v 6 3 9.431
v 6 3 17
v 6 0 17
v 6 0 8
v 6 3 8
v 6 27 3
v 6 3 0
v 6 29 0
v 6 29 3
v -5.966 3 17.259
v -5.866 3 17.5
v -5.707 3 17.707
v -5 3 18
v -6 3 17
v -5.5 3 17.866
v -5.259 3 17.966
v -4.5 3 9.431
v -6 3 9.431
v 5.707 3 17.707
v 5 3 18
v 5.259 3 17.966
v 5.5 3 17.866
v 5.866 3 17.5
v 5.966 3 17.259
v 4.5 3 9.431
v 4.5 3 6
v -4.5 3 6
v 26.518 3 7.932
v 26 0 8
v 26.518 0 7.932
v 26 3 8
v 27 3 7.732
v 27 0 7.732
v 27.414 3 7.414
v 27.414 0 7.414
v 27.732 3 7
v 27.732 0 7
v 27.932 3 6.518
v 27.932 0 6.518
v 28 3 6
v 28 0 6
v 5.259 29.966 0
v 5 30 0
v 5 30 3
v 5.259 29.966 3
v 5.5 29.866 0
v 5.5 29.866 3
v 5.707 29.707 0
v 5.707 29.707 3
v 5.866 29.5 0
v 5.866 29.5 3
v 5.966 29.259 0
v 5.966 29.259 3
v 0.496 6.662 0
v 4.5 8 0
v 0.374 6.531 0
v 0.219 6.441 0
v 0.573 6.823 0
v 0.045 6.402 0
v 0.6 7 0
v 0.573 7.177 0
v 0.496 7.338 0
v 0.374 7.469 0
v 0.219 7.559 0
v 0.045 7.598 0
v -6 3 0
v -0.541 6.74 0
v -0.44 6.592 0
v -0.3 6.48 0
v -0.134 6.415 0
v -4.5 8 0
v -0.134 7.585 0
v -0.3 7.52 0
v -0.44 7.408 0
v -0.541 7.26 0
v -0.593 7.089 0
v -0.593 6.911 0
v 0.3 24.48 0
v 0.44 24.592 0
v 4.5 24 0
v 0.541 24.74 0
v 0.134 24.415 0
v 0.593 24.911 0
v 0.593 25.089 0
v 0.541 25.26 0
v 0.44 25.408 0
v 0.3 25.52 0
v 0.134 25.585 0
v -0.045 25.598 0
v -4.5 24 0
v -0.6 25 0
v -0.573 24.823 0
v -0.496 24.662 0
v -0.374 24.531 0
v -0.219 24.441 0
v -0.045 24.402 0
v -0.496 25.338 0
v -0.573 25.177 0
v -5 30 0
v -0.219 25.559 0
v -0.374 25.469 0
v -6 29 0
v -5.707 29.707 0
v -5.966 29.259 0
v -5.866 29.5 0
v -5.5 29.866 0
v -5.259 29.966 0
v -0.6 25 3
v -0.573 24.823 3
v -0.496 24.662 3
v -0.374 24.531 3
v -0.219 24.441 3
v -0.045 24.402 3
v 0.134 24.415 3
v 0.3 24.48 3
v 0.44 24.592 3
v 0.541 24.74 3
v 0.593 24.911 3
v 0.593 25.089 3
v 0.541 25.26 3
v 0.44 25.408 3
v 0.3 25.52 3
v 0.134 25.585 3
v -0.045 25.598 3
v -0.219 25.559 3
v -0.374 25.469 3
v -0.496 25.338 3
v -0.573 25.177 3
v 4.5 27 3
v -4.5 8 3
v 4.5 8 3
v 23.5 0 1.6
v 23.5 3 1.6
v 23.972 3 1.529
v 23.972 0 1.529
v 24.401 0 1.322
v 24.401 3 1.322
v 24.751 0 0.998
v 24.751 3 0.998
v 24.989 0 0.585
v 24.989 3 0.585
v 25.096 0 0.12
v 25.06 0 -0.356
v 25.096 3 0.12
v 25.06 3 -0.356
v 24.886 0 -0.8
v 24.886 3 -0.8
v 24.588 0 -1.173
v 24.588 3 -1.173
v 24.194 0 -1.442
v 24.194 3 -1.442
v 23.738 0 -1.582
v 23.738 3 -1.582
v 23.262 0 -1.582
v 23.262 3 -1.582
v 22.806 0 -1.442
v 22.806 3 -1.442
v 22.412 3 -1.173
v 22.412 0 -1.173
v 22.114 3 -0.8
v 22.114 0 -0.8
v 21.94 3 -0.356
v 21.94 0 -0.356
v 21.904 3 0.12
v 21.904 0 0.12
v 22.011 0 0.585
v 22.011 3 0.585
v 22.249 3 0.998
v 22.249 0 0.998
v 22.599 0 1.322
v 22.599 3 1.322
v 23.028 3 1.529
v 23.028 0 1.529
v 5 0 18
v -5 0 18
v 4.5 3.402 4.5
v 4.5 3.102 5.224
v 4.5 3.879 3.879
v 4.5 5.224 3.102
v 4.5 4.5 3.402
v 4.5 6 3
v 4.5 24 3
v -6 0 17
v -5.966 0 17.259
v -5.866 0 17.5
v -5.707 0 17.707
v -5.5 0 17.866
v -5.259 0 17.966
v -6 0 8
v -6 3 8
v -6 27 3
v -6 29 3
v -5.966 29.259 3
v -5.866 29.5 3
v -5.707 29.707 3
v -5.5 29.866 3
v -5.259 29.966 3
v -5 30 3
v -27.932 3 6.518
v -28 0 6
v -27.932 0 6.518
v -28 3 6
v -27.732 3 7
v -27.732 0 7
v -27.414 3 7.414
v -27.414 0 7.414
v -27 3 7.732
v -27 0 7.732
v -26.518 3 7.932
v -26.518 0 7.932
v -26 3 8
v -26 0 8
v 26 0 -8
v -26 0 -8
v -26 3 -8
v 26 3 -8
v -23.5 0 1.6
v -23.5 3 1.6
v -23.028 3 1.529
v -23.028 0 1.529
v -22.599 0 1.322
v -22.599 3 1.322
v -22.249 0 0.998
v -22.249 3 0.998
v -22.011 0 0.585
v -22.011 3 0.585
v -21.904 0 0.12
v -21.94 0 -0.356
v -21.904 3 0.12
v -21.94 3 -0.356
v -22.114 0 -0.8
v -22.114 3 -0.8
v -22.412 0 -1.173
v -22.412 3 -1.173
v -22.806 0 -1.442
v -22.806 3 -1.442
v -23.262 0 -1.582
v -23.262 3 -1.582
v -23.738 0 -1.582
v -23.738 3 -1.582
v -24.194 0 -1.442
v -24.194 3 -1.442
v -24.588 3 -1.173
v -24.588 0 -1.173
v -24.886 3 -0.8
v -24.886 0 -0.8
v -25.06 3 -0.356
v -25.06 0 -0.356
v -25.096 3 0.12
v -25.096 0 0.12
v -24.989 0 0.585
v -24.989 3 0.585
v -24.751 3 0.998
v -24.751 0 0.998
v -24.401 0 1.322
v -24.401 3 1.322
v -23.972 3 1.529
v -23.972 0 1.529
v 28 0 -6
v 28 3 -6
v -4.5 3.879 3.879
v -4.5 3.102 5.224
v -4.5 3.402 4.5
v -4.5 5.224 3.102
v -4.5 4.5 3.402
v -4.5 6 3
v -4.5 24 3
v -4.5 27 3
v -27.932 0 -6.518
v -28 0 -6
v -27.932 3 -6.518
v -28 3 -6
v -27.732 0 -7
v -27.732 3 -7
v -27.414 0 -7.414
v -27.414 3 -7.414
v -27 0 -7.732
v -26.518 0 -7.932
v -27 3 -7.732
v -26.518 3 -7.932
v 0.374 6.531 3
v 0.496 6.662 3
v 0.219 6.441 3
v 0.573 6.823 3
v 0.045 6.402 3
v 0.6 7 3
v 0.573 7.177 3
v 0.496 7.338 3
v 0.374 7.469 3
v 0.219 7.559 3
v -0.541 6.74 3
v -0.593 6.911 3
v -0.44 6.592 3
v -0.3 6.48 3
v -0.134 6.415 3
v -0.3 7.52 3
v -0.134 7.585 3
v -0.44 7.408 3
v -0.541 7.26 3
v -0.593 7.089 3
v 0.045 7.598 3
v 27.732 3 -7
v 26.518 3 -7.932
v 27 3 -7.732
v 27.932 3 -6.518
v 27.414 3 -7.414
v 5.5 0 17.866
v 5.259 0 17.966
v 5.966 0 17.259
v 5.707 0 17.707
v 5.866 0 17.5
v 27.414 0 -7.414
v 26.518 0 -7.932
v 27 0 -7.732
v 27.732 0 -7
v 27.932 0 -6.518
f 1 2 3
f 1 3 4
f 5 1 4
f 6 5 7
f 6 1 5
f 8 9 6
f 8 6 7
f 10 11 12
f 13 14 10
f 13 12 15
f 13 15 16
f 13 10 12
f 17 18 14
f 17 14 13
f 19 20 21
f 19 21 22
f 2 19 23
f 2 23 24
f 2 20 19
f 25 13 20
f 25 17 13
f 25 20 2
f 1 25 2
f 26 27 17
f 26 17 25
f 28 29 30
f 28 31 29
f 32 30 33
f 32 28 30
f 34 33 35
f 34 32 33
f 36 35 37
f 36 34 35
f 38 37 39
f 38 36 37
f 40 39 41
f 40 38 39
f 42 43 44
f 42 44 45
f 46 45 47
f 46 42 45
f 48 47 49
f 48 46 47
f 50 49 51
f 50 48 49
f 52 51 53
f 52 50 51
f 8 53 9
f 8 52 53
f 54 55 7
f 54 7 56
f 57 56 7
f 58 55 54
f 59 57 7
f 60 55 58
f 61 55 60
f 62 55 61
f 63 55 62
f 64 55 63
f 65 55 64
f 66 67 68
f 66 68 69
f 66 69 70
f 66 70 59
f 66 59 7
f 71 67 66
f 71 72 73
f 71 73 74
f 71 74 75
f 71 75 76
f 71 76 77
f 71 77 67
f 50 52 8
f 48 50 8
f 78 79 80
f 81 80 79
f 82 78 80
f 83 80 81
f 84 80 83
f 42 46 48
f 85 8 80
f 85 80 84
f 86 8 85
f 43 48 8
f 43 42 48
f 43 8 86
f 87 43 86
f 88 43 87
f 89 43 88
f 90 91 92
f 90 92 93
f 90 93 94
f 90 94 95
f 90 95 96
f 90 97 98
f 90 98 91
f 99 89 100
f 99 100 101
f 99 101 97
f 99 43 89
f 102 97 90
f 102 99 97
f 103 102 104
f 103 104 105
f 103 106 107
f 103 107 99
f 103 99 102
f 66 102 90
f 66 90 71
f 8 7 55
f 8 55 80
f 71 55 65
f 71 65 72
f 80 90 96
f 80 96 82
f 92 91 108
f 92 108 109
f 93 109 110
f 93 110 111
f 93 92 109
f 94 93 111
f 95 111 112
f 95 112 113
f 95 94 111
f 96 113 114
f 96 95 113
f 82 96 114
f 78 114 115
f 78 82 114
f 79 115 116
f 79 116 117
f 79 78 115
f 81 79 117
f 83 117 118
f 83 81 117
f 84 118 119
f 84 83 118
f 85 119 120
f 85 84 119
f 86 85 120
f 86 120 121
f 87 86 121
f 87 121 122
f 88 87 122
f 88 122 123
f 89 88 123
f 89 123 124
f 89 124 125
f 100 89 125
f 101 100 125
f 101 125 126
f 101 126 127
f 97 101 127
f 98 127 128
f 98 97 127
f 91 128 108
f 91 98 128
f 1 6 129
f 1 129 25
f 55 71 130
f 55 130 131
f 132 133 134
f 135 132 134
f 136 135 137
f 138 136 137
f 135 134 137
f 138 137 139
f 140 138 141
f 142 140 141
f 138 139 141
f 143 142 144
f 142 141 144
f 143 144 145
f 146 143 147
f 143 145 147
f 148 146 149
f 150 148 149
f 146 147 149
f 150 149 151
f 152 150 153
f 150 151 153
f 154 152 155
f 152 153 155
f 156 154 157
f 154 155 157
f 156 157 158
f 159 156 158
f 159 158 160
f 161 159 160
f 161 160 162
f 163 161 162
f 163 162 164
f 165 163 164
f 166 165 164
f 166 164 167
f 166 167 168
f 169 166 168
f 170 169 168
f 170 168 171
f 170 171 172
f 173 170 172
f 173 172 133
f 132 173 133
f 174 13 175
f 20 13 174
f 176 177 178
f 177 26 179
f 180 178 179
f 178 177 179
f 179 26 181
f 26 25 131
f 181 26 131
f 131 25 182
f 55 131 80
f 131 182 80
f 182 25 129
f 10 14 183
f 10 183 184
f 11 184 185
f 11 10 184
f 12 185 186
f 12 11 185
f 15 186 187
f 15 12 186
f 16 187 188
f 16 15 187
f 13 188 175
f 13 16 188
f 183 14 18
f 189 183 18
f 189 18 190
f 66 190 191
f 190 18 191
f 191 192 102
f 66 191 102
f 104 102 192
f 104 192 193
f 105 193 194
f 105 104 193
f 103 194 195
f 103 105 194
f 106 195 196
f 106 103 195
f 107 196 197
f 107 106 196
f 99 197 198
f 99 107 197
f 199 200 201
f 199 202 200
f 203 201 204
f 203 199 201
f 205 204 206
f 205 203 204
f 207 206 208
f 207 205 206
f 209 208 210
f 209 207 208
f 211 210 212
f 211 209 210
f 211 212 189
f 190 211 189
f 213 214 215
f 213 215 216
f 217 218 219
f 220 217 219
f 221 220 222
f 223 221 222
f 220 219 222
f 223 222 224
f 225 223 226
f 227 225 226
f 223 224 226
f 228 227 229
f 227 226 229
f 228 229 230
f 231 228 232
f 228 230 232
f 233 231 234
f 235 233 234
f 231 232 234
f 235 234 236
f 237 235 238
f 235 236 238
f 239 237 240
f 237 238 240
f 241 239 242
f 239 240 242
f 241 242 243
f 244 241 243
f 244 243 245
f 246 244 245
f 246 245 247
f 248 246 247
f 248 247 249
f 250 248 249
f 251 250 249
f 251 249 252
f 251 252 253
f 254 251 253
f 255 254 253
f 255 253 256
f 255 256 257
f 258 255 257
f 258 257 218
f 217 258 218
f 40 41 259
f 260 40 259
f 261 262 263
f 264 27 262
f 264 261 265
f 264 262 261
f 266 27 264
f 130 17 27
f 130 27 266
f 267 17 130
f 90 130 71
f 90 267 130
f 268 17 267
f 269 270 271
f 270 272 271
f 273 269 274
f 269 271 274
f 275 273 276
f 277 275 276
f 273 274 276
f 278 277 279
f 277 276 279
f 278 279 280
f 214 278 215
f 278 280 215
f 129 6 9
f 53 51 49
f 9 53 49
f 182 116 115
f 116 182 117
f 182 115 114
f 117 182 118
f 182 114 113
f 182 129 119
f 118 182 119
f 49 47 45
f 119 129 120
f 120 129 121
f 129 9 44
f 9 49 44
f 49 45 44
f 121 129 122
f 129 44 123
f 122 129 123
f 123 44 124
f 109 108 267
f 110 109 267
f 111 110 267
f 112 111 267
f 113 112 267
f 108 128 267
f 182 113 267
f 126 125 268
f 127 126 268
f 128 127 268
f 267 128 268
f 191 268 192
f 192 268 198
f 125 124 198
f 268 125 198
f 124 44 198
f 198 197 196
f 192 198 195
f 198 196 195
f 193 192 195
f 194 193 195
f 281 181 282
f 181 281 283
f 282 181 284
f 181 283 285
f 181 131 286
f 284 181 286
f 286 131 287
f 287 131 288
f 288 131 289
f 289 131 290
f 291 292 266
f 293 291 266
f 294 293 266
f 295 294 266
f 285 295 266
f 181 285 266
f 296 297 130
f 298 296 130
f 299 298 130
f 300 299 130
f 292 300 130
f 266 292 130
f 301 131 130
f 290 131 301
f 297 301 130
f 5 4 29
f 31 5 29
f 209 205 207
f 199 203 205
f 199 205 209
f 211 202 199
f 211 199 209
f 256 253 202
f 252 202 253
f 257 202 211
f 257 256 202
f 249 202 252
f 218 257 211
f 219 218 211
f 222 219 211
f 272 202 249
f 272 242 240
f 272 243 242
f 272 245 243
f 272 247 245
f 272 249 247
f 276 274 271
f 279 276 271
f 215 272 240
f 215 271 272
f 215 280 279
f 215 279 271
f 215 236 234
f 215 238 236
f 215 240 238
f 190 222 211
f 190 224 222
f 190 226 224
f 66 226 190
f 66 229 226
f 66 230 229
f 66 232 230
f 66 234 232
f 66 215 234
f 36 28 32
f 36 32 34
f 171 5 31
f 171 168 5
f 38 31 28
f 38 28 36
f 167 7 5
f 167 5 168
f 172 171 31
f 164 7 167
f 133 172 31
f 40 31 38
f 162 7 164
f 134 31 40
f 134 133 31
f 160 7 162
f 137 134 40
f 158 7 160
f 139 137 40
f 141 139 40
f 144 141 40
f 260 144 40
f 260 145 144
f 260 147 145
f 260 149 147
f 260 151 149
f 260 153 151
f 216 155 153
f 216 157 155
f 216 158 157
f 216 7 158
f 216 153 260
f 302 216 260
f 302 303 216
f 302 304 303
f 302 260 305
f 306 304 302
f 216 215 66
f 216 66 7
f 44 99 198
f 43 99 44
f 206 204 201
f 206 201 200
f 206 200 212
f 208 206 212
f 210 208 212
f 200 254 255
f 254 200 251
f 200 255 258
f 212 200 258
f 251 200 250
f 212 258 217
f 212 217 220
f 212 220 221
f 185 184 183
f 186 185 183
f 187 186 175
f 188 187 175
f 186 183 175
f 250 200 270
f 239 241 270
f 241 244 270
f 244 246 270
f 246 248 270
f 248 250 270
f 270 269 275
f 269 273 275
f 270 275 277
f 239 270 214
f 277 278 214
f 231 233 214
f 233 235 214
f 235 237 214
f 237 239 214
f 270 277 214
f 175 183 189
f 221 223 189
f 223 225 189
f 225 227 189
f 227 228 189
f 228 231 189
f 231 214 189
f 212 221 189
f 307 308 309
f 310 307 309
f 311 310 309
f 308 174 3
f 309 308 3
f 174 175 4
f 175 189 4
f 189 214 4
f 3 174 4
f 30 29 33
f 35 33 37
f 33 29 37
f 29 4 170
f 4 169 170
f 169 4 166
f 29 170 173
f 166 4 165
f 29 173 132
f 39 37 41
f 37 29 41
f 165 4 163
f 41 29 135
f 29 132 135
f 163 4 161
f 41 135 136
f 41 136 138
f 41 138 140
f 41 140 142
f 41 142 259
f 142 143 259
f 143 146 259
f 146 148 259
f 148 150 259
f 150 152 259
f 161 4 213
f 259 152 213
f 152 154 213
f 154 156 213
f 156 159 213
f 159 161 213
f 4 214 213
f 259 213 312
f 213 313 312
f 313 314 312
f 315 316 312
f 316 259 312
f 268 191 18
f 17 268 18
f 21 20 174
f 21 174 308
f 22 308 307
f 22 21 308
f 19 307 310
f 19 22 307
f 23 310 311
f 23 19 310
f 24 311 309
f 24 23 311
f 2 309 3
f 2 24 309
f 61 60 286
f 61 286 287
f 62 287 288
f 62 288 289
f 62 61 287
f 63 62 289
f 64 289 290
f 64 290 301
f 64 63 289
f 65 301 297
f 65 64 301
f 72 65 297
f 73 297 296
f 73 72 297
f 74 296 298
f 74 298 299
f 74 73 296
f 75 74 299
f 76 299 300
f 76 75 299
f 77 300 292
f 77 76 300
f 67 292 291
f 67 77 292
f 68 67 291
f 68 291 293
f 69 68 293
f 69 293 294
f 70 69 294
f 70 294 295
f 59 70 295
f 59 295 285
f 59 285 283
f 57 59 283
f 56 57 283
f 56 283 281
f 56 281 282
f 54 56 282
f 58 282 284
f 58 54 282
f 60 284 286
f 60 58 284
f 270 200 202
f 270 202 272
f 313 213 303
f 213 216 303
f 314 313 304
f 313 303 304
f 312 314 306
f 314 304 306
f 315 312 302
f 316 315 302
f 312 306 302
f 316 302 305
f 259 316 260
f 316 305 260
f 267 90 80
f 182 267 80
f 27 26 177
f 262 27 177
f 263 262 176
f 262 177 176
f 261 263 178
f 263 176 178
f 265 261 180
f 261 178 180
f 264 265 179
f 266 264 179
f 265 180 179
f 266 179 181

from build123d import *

# Parameters (mm, degrees)
SKETCH_1_W          = 56
SKETCH_1_H          = 16
EXTRUDE_1_DEPTH     = 3
SKETCH_3_R          = 1.6
CUT_EXTRUDE_2_DEPTH = 5
FILLET_1_R          = 2
EXTRUDE_2_DEPTH     = 3
SKETCH_5_R          = 0.6
SKETCH_5_W          = 9
SKETCH_5_H          = 16
EXTRUDE_3_DEPTH     = 3
EXTRUDE_5_DEPTH     = 1.5
EXTRUDE_6_DEPTH     = 1.5
EXTRUDE_7_DEPTH     = 9


with BuildPart() as part:
    # 草图1 → 凸台-拉伸1 (new body)
    with BuildSketch(Plane(origin=(0, 0, 0), x_dir=(1, 0, 0), z_dir=(0, 1, 0))):
        Rectangle(SKETCH_1_W, SKETCH_1_H)
    extrude(amount=EXTRUDE_1_DEPTH)

    # 草图3 → 切除-拉伸2 (cut)
    with BuildSketch(Plane(origin=(0, 3, 0), x_dir=(1, 0, 0), z_dir=(0, 1, 0))):
        with Locations(Location((23.5, 0, 0), (0, 0, 270))):
            Circle(SKETCH_3_R)
        with Locations(Location((-23.5, 0, 0), (0, 0, 270))):
            Circle(SKETCH_3_R)
    extrude(amount=-CUT_EXTRUDE_2_DEPTH, mode=Mode.SUBTRACT)

    # 圆角1
    fillet_1_edges = [part.edges().sort_by_distance(p)[0] for p in [
        (28, 1.5, 8),
        (-28, 1.5, 8),
        (-28, 1.5, -8),
        (28, 1.5, -8),
    ]]
    fillet(fillet_1_edges, radius=FILLET_1_R)

    # 草图4 → 凸台-拉伸2 (add)
    with BuildSketch(Plane(origin=(0, 3, 0), x_dir=(1, 0, 0), z_dir=(0, 1, 0))):
        with BuildLine():
            Line((0, -8), (0, -18))
            Line((0, -18), (5, -18))
            ThreePointArc((5, -18), (5.707106781, -17.707106781), (6, -17))
            Line((6, -17), (6, -8))
            Line((6, -8), (0, -8))
        make_face()
        with BuildLine():
            Line((-5, -18), (0, -18))
            Line((0, -18), (0, -8))
            Line((0, -8), (-6, -8))
            Line((-6, -8), (-6, -17))
            ThreePointArc((-6, -17), (-5.707106781, -17.707106781), (-5, -18))
        make_face()
    extrude(amount=-EXTRUDE_2_DEPTH)

    # 草图5 → 凸台-拉伸3 (add)
    with BuildSketch(Plane.XY):
        with BuildLine():
            Line((-6, 3), (-6, 29))
            ThreePointArc((-6, 29), (-5.707106781, 29.707106781), (-5, 30))
            Line((-5, 30), (5, 30))
            ThreePointArc((5, 30), (5.707106781, 29.707106781), (6, 29))
            Line((6, 29), (6, 3))
            Line((6, 3), (-6, 3))
        make_face()
        with Locations((0, 7)):
            Circle(SKETCH_5_R, mode=Mode.SUBTRACT)
        with Locations(Location((0, 25, 0), (0, 0, 180))):
            Circle(SKETCH_5_R, mode=Mode.SUBTRACT)
        with Locations((0, 16)):
            Rectangle(SKETCH_5_W, SKETCH_5_H, mode=Mode.SUBTRACT)
    extrude(amount=EXTRUDE_3_DEPTH)

    # 草图7 → 凸台-拉伸5 (add)
    with BuildSketch(Plane(origin=(6, 0, 0), x_dir=(0, 0, -1), z_dir=(1, 0, 0))):
        Polygon((-3, 27), (-9.430780618, 3), (-3, 3), align=None)
    extrude(amount=-EXTRUDE_5_DEPTH)

    # 草图8 → 凸台-拉伸6 (add)
    with BuildSketch(Plane.ZY.offset(6)):
        Polygon((3, 27), (9.430780618, 3), (3, 3), align=None)
    extrude(amount=-EXTRUDE_6_DEPTH)

    # 草图9 → 凸台-拉伸7 (add)
    with BuildSketch(Plane.ZY.offset(-4.5)):
        with BuildLine():
            Line((3, 6), (3, 3))
            Line((3, 3), (6, 3))
            ThreePointArc((6, 3), (3.878679656, 3.878679656), (3, 6))
        make_face()
    extrude(amount=EXTRUDE_7_DEPTH)


solid = part.part
